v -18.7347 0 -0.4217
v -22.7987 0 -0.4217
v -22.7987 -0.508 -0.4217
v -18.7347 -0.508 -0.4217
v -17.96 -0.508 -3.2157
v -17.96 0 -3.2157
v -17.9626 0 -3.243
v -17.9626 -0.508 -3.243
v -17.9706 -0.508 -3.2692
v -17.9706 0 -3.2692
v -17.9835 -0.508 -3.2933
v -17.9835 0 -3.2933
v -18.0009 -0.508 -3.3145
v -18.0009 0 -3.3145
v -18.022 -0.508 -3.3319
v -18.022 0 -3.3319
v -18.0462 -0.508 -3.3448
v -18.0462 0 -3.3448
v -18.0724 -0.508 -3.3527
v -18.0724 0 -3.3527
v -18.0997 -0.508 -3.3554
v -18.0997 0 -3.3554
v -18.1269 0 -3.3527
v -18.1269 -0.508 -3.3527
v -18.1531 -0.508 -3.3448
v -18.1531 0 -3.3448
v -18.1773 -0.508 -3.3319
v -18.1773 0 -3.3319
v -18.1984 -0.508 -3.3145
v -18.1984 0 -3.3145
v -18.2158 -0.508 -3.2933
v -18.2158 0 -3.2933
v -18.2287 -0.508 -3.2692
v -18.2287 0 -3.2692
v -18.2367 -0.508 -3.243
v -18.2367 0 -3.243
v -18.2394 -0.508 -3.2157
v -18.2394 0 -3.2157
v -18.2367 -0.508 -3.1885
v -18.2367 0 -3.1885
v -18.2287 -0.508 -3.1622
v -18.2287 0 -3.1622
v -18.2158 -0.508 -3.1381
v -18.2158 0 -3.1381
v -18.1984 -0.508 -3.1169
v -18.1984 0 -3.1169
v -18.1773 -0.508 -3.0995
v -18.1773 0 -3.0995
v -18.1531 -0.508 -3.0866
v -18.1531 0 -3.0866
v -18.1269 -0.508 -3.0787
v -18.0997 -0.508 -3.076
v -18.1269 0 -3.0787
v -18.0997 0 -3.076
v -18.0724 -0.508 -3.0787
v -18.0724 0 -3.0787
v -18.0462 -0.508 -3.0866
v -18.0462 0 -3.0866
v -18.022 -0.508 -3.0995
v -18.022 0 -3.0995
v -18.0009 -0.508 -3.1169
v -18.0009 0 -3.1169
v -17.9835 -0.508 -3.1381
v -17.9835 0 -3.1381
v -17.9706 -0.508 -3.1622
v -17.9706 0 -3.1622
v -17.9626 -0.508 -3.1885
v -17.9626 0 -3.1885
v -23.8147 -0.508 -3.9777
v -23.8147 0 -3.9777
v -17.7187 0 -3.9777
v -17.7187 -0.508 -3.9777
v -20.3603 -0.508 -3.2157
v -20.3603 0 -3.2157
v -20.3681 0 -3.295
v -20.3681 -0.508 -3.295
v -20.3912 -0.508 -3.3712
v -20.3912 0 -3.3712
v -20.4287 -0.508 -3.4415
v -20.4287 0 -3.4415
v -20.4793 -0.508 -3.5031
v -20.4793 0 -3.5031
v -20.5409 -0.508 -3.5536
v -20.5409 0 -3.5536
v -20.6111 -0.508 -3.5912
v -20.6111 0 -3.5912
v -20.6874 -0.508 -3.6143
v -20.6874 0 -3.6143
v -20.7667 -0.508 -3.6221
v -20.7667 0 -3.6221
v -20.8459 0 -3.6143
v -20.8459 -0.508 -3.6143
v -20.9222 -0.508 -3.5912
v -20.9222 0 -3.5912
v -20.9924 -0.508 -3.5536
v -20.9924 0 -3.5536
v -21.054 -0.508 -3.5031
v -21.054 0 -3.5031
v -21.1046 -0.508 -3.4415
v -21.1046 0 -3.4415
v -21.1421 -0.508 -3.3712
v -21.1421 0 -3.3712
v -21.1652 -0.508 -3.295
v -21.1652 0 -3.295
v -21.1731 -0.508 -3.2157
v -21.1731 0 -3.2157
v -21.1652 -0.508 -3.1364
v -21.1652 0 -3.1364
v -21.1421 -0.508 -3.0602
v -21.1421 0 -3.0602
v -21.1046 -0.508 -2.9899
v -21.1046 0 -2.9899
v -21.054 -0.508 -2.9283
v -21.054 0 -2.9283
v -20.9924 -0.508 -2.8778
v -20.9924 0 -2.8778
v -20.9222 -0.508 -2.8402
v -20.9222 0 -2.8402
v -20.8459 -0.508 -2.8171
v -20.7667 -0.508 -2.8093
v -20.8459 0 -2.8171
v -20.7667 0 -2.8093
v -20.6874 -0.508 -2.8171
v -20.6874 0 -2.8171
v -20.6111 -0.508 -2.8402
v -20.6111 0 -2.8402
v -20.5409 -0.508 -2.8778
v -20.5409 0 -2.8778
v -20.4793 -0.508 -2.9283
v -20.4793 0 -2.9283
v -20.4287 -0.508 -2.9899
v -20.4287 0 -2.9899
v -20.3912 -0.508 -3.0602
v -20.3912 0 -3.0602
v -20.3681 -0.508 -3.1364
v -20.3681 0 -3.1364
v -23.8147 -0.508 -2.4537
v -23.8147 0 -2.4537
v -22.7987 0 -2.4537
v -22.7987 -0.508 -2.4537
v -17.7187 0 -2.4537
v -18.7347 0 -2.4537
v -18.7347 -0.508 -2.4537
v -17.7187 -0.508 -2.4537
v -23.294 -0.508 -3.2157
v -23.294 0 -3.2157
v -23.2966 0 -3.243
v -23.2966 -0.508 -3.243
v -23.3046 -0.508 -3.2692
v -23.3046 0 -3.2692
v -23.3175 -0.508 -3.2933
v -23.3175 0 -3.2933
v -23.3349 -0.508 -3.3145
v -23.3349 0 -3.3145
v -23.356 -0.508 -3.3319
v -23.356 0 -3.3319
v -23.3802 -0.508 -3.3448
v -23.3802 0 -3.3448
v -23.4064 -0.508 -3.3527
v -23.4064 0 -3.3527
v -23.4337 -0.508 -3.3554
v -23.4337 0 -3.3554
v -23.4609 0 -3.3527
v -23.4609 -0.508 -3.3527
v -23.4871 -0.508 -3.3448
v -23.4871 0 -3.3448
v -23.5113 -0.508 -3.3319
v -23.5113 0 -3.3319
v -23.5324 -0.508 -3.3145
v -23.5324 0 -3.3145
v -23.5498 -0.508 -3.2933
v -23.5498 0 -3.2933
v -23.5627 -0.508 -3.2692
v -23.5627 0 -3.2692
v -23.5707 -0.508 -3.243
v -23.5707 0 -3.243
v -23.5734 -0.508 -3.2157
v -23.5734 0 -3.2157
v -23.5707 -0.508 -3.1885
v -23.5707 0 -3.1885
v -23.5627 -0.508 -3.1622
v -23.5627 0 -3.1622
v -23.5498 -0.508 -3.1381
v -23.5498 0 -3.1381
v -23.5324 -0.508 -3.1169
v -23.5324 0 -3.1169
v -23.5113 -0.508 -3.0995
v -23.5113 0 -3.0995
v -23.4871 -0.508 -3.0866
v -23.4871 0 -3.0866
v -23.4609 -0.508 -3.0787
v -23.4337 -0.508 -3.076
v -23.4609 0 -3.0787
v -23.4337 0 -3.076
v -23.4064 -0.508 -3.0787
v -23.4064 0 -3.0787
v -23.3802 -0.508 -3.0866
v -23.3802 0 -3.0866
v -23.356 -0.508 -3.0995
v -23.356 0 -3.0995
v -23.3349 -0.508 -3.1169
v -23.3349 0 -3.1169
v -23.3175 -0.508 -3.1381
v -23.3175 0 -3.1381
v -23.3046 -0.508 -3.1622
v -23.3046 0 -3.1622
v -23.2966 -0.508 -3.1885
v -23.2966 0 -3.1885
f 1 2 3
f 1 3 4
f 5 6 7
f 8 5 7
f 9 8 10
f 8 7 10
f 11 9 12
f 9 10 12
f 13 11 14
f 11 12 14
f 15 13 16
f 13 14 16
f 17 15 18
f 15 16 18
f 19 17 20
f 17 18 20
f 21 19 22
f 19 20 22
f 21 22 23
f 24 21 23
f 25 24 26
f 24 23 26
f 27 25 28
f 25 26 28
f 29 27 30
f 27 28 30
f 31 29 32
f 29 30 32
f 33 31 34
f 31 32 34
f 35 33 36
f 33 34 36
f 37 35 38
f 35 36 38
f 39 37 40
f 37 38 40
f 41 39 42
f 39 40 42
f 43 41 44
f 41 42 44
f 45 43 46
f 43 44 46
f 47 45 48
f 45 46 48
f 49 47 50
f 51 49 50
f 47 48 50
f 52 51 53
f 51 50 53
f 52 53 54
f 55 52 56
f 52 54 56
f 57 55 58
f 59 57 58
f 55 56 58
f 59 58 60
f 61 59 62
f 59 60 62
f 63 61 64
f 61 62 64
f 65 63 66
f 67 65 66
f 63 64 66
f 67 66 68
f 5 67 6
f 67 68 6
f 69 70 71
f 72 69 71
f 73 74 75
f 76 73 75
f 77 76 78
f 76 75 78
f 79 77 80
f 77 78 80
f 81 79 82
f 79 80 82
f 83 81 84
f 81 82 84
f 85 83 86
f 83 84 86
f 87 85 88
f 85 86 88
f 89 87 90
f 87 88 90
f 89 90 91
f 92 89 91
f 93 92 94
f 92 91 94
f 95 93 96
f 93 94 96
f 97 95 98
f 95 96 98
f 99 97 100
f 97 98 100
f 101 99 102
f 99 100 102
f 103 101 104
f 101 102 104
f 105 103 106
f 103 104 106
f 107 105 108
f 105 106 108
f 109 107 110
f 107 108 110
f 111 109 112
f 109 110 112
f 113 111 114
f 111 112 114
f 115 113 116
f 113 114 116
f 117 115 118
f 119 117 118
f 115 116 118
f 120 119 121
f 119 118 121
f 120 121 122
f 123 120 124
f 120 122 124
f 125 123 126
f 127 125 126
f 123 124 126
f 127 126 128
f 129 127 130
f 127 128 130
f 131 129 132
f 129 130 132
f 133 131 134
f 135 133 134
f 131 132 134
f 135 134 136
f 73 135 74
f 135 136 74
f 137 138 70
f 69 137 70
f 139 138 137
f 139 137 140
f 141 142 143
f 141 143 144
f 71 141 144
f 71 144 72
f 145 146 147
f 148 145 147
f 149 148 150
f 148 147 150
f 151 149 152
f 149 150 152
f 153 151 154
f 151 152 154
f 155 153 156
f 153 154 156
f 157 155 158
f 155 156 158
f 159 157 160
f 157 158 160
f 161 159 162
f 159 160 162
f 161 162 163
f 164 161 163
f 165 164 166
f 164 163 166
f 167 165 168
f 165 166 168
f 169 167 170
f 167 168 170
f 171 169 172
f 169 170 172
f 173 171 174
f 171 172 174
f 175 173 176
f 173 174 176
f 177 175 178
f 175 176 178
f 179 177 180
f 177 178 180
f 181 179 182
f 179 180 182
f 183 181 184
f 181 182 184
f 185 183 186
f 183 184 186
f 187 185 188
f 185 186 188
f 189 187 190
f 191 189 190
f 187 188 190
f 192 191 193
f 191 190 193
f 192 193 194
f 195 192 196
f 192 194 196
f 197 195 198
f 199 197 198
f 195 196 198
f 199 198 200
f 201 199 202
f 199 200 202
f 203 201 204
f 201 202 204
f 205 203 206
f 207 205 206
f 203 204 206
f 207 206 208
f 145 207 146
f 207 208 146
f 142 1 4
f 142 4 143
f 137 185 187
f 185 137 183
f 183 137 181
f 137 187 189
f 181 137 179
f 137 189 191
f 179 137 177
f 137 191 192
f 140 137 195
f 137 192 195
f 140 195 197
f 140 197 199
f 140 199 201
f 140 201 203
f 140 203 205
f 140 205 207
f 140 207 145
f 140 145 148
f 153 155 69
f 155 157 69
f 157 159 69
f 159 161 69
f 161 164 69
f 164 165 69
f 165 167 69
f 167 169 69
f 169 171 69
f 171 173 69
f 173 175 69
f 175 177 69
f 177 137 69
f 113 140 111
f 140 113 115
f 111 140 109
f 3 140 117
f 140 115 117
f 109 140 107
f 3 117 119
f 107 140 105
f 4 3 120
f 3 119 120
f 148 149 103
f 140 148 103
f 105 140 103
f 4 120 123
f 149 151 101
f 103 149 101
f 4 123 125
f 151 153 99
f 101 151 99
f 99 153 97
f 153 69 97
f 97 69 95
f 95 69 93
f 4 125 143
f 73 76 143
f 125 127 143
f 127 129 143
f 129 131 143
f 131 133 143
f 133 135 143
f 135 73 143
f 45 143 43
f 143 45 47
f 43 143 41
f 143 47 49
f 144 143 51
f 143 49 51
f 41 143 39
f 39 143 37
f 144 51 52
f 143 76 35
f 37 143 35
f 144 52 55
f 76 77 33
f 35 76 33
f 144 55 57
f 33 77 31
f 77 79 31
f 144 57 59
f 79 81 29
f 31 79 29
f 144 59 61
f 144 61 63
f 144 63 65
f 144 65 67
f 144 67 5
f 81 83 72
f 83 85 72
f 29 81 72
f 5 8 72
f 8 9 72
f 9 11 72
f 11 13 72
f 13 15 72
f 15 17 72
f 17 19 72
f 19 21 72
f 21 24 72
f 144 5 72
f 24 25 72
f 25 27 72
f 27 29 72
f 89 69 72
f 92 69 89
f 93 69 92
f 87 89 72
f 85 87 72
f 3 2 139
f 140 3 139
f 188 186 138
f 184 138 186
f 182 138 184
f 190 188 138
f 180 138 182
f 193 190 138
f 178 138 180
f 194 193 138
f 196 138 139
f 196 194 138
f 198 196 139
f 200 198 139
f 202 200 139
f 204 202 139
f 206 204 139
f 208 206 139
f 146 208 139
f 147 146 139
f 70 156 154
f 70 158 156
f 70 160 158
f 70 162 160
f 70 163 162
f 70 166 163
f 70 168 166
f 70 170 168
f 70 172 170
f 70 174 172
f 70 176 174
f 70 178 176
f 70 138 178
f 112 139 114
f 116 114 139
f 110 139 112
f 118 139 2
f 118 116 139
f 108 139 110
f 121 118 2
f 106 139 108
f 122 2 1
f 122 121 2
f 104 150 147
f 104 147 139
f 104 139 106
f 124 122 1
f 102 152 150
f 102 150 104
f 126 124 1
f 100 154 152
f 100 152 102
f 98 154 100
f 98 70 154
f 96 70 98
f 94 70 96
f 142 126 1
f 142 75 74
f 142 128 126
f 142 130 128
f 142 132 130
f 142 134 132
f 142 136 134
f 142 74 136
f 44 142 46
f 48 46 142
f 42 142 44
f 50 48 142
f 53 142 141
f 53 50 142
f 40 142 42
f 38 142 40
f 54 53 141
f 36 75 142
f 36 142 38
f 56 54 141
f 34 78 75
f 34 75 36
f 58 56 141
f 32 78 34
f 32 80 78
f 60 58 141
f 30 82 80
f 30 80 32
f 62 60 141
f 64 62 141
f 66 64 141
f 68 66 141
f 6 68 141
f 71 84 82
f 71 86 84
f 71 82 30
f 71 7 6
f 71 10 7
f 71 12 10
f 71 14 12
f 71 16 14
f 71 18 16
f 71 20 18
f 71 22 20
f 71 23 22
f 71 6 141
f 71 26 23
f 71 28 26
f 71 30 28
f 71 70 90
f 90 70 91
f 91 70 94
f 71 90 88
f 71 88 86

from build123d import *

# Parameters (mm, degrees)
SHUTTLE_W                = 6.096
SHUTTLE_H                = 1.524
SHUTTLE_EXTR_DEPTH       = 0.508
ELEC_BOUNDING_W          = 4.064
ELEC_BOUNDING_H          = 2.032
ELEC_BOUNDING_EXTR_DEPTH = 0.508
DRIVE_SCREW_R            = 0.4064
DRIVE_SCREW_EXTR_DEPTH   = 0.508
GUIDE_HOLES_R            = 0.1397
GUIDE_HOLES_EXTR_DEPTH   = 0.508


with BuildPart() as part:
    # shuttle → shuttle_extr (new body)
    with BuildSketch(Plane(origin=(0, 0, 0), x_dir=(1, 0, 0), z_dir=(0, 1, 0))):
        with Locations((-20.766651572, 3.215704526)):
            Rectangle(SHUTTLE_W, SHUTTLE_H)
    extrude(amount=-SHUTTLE_EXTR_DEPTH)

    # elec_bounding → elec_bounding_extr (add)
    with BuildSketch(Plane(origin=(0, 0, 0), x_dir=(1, 0, 0), z_dir=(0, 1, 0))):
        with Locations((-20.766651572, 1.437704526)):
            Rectangle(ELEC_BOUNDING_W, ELEC_BOUNDING_H)
    extrude(amount=-ELEC_BOUNDING_EXTR_DEPTH)

    # drive_screw → drive_screw_extr (cut)
    with BuildSketch(Plane(origin=(0, 0, 0), x_dir=(1, 0, 0), z_dir=(0, 1, 0))):
        with Locations((-20.766651572, 3.215704526)):
            Circle(DRIVE_SCREW_R)
    extrude(amount=-DRIVE_SCREW_EXTR_DEPTH, mode=Mode.SUBTRACT)

    # guide_holes → guide_holes_extr (cut)
    with BuildSketch(Plane(origin=(0, 0, 0), x_dir=(1, 0, 0), z_dir=(0, 1, 0))):
        with Locations((-23.433651572, 3.215704526)):
            Circle(GUIDE_HOLES_R)
        with Locations((-18.099651572, 3.215704526)):
            Circle(GUIDE_HOLES_R)
    extrude(amount=-GUIDE_HOLES_EXTR_DEPTH, mode=Mode.SUBTRACT)


solid = part.part
